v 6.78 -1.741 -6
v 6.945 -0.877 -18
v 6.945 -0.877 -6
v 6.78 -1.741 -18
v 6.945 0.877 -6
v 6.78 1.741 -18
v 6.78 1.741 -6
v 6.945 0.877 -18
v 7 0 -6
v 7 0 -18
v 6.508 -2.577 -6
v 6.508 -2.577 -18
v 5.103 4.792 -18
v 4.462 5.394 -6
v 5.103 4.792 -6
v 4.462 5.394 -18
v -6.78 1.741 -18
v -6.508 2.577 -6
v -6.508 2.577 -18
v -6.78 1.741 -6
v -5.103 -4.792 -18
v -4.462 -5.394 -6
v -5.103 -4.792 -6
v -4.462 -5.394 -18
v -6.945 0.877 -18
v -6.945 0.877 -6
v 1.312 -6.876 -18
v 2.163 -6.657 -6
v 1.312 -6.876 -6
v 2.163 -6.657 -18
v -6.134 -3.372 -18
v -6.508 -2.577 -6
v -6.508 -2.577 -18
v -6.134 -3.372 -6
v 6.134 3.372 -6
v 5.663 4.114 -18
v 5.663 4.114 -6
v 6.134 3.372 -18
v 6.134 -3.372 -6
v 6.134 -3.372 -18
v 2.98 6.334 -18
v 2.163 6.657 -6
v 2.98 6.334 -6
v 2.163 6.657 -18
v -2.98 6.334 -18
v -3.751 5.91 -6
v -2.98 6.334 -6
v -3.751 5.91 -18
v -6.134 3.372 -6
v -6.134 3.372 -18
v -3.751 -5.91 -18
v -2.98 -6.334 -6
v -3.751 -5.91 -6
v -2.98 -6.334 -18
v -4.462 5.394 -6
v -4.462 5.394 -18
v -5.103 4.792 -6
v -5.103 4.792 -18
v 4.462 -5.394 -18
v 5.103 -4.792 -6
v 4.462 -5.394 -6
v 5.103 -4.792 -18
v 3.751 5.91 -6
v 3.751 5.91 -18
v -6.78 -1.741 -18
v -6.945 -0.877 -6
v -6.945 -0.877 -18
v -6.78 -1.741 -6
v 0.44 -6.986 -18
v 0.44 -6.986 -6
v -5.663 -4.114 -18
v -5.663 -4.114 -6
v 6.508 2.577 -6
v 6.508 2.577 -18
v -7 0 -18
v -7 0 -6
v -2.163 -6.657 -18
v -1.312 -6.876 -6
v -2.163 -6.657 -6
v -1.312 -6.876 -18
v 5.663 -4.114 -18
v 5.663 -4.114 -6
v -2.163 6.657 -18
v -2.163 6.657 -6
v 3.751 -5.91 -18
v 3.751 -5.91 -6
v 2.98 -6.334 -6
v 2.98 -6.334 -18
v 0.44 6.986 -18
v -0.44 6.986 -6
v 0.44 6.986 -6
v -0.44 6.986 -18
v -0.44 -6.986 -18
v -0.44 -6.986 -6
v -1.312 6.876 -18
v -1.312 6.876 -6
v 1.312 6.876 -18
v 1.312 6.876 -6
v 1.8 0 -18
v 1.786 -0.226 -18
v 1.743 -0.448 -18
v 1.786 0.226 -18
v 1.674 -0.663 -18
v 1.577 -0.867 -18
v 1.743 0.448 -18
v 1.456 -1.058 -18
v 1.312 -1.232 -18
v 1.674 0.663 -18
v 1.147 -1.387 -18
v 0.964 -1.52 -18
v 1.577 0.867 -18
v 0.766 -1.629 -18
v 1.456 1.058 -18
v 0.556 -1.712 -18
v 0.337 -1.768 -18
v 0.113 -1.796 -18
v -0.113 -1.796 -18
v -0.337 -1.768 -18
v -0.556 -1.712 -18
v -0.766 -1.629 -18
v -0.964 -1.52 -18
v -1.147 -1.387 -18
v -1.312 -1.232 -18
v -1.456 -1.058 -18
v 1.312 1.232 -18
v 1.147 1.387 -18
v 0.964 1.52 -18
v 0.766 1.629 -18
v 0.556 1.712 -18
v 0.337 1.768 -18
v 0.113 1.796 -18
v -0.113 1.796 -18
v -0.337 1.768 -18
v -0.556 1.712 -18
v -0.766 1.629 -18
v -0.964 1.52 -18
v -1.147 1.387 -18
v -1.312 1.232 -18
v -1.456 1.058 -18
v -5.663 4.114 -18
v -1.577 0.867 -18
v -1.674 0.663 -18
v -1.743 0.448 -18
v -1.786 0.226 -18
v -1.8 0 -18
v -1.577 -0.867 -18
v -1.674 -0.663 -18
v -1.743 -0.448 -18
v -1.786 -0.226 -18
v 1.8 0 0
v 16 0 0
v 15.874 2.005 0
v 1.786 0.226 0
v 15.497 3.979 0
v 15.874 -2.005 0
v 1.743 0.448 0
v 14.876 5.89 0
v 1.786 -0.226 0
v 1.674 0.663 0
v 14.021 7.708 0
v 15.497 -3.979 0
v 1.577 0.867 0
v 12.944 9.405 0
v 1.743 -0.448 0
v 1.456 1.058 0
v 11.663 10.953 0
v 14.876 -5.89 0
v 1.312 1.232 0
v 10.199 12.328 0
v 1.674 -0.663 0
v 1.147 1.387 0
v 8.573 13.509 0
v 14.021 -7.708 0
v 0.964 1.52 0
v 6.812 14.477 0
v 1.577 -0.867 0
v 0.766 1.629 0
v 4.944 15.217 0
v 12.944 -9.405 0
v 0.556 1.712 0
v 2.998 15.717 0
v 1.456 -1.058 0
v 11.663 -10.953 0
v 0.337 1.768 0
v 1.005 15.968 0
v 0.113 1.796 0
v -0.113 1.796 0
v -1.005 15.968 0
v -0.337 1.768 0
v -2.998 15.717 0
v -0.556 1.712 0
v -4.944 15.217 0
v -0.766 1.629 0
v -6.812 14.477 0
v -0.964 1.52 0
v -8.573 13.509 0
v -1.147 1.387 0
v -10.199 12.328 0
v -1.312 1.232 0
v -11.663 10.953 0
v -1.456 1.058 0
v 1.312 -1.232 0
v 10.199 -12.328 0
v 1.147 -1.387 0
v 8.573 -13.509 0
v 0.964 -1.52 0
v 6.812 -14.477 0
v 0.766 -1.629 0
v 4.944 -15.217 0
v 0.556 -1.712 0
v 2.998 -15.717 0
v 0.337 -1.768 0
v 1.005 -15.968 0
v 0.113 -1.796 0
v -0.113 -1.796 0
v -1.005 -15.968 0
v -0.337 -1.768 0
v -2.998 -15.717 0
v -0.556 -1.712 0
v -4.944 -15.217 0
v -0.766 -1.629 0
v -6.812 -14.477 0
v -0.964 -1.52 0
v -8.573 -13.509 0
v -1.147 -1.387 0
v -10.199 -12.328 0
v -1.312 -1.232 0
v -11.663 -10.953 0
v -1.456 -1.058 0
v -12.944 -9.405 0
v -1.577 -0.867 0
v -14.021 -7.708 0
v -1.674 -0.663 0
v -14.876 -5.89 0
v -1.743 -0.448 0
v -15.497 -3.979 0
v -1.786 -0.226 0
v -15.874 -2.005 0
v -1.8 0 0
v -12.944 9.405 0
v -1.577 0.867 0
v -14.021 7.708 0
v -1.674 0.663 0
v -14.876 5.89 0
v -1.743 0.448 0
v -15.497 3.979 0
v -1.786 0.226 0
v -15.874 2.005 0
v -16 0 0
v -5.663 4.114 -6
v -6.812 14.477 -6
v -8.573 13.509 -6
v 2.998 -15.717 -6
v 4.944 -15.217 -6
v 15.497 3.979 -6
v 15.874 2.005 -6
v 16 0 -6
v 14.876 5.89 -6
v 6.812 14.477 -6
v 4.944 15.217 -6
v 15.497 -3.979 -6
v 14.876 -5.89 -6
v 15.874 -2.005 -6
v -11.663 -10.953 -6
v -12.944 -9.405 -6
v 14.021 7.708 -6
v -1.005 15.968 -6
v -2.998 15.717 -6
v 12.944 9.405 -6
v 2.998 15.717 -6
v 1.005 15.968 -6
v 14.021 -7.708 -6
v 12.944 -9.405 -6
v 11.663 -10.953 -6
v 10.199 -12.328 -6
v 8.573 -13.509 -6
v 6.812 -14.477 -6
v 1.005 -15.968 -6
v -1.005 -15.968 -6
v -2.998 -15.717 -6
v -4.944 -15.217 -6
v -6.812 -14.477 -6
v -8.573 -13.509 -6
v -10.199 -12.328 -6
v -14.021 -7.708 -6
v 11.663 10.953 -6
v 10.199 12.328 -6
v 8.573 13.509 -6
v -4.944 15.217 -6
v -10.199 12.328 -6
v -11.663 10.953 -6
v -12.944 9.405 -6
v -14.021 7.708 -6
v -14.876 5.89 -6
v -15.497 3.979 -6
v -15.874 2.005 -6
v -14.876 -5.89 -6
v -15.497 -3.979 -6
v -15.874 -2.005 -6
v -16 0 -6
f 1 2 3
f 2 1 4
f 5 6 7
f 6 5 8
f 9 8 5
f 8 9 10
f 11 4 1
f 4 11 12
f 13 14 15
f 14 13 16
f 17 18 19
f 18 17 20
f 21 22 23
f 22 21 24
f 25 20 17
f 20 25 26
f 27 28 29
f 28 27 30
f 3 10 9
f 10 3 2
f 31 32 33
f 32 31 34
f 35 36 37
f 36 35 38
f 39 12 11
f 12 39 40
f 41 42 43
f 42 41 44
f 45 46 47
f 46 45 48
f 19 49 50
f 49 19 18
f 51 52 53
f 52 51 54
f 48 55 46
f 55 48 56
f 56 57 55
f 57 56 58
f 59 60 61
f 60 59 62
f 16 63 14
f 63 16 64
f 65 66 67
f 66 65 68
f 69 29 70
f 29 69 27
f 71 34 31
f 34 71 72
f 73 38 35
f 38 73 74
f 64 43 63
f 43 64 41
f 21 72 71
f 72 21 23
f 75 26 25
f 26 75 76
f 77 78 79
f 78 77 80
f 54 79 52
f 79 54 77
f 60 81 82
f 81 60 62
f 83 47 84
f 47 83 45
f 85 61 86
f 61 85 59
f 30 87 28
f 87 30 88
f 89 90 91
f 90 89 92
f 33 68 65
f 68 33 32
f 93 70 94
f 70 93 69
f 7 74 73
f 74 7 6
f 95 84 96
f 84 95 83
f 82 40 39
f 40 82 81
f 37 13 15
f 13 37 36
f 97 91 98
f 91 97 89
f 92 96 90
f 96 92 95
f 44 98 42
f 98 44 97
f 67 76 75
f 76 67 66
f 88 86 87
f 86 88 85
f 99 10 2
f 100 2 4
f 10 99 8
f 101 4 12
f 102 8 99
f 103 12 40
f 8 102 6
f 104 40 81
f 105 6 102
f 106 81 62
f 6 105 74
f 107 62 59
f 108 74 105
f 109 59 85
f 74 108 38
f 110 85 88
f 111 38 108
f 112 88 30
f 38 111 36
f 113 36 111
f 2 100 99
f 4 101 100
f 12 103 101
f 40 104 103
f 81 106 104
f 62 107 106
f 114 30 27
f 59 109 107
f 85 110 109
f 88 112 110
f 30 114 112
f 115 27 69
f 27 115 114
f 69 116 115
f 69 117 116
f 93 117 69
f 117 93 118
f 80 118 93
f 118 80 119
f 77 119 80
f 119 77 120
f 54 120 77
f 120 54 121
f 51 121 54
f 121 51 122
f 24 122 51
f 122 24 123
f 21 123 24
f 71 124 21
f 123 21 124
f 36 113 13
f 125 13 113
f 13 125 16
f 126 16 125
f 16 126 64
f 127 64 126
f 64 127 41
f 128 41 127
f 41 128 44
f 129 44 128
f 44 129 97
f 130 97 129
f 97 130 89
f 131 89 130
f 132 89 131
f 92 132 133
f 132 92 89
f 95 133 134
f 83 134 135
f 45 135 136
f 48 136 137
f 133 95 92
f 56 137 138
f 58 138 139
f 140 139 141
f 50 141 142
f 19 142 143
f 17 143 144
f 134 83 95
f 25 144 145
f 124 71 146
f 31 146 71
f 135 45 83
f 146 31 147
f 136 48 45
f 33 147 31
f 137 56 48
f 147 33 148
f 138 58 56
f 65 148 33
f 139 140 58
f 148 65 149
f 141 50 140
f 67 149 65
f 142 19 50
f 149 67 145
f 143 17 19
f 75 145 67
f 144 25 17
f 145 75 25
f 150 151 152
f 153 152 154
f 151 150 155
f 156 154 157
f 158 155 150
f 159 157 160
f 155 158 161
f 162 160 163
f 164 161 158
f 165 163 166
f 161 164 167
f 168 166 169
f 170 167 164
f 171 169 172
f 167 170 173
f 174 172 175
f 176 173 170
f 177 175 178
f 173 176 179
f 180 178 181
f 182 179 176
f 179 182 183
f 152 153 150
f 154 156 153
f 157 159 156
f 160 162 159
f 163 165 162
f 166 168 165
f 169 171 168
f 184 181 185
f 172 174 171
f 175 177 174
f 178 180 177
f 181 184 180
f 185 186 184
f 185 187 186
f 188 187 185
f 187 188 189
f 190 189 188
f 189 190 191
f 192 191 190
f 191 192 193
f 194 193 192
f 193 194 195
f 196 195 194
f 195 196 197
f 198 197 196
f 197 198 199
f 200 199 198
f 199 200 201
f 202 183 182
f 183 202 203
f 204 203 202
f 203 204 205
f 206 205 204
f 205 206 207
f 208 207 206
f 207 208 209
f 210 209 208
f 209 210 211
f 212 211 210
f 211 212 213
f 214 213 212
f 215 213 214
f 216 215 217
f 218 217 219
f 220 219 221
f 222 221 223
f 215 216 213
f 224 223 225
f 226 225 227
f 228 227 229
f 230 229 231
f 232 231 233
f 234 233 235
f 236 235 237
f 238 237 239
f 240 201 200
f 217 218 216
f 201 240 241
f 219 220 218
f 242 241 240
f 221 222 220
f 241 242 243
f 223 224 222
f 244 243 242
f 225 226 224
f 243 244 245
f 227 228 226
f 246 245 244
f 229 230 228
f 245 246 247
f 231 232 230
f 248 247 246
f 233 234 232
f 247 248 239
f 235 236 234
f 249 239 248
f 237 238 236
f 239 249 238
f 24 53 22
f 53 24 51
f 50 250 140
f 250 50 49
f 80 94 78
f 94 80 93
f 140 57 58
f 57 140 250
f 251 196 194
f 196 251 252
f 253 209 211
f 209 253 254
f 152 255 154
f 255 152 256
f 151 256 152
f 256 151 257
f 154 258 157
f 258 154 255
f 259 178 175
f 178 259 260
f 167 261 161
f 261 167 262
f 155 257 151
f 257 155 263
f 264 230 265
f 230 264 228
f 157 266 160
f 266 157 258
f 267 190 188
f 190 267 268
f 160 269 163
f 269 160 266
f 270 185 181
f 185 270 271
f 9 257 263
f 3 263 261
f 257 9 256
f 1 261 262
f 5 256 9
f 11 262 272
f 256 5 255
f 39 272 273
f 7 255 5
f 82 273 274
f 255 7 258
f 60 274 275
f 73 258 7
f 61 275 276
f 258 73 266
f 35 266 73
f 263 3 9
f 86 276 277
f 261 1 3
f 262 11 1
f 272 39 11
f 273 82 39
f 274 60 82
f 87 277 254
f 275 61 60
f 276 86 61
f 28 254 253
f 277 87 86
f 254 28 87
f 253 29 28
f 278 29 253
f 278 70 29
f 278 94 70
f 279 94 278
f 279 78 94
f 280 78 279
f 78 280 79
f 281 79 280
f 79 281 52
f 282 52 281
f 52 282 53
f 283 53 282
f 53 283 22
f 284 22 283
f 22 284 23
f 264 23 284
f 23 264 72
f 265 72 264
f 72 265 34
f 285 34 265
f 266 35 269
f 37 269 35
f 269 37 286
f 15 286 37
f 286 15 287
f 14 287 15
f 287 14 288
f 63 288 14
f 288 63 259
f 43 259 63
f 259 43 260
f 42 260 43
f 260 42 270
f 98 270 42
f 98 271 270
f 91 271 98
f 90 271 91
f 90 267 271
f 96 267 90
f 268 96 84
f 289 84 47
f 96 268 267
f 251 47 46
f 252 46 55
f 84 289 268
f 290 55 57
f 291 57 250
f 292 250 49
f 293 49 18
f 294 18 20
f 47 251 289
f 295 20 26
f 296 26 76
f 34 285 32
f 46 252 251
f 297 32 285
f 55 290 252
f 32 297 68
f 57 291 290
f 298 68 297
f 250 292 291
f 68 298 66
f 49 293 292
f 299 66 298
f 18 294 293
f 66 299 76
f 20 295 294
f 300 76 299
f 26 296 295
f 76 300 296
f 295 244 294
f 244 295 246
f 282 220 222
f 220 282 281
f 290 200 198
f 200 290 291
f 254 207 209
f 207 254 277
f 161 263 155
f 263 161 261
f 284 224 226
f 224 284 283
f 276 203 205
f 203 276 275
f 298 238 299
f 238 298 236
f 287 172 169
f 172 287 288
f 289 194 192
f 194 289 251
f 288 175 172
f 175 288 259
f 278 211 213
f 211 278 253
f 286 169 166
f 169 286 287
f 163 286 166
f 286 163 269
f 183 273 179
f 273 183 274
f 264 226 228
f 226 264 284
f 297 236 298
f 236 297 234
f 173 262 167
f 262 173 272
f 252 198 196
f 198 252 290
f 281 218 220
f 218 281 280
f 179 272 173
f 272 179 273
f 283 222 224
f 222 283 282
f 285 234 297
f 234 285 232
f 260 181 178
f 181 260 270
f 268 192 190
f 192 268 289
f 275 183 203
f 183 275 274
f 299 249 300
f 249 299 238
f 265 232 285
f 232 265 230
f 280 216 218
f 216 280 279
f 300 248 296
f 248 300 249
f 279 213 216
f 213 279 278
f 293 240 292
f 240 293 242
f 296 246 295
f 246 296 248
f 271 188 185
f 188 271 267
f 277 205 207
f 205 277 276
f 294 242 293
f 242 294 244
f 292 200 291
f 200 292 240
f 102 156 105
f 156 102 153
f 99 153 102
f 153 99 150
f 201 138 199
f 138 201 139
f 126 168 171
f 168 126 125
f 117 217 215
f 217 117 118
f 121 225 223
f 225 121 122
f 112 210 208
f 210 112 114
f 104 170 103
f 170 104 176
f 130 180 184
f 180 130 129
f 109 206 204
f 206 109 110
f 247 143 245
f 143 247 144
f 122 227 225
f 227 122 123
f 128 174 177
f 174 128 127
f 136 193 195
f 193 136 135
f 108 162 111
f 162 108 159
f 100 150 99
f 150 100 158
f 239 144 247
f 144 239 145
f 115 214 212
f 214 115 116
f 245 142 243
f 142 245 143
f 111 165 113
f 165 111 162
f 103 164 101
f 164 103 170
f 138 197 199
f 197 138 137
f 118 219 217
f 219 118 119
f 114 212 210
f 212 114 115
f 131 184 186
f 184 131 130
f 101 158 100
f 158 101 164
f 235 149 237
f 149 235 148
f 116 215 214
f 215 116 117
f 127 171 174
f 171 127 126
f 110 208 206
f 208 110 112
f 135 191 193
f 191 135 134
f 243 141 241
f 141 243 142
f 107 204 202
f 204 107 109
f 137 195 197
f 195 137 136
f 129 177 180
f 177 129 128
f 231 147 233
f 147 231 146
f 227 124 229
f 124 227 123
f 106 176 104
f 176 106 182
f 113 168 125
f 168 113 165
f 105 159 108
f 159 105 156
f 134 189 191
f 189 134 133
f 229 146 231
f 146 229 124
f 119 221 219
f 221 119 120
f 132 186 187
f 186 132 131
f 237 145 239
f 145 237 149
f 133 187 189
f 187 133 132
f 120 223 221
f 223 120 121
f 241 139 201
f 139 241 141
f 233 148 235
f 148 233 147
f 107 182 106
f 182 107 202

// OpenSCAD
$fn = 50;


difference() {
	union() {
		translate(v = [0, 0, -18.0000000000]) {
			cylinder(h = 18, r = 7.0000000000);
		}
		translate(v = [0, 0, -6.0000000000]) {
			cylinder(h = 6, r = 16.0000000000);
		}
	}
	union() {
		#translate(v = [0, 0, -18]) {
			cylinder(h = 18, r = 1.8000000000);
		}
	}
}
